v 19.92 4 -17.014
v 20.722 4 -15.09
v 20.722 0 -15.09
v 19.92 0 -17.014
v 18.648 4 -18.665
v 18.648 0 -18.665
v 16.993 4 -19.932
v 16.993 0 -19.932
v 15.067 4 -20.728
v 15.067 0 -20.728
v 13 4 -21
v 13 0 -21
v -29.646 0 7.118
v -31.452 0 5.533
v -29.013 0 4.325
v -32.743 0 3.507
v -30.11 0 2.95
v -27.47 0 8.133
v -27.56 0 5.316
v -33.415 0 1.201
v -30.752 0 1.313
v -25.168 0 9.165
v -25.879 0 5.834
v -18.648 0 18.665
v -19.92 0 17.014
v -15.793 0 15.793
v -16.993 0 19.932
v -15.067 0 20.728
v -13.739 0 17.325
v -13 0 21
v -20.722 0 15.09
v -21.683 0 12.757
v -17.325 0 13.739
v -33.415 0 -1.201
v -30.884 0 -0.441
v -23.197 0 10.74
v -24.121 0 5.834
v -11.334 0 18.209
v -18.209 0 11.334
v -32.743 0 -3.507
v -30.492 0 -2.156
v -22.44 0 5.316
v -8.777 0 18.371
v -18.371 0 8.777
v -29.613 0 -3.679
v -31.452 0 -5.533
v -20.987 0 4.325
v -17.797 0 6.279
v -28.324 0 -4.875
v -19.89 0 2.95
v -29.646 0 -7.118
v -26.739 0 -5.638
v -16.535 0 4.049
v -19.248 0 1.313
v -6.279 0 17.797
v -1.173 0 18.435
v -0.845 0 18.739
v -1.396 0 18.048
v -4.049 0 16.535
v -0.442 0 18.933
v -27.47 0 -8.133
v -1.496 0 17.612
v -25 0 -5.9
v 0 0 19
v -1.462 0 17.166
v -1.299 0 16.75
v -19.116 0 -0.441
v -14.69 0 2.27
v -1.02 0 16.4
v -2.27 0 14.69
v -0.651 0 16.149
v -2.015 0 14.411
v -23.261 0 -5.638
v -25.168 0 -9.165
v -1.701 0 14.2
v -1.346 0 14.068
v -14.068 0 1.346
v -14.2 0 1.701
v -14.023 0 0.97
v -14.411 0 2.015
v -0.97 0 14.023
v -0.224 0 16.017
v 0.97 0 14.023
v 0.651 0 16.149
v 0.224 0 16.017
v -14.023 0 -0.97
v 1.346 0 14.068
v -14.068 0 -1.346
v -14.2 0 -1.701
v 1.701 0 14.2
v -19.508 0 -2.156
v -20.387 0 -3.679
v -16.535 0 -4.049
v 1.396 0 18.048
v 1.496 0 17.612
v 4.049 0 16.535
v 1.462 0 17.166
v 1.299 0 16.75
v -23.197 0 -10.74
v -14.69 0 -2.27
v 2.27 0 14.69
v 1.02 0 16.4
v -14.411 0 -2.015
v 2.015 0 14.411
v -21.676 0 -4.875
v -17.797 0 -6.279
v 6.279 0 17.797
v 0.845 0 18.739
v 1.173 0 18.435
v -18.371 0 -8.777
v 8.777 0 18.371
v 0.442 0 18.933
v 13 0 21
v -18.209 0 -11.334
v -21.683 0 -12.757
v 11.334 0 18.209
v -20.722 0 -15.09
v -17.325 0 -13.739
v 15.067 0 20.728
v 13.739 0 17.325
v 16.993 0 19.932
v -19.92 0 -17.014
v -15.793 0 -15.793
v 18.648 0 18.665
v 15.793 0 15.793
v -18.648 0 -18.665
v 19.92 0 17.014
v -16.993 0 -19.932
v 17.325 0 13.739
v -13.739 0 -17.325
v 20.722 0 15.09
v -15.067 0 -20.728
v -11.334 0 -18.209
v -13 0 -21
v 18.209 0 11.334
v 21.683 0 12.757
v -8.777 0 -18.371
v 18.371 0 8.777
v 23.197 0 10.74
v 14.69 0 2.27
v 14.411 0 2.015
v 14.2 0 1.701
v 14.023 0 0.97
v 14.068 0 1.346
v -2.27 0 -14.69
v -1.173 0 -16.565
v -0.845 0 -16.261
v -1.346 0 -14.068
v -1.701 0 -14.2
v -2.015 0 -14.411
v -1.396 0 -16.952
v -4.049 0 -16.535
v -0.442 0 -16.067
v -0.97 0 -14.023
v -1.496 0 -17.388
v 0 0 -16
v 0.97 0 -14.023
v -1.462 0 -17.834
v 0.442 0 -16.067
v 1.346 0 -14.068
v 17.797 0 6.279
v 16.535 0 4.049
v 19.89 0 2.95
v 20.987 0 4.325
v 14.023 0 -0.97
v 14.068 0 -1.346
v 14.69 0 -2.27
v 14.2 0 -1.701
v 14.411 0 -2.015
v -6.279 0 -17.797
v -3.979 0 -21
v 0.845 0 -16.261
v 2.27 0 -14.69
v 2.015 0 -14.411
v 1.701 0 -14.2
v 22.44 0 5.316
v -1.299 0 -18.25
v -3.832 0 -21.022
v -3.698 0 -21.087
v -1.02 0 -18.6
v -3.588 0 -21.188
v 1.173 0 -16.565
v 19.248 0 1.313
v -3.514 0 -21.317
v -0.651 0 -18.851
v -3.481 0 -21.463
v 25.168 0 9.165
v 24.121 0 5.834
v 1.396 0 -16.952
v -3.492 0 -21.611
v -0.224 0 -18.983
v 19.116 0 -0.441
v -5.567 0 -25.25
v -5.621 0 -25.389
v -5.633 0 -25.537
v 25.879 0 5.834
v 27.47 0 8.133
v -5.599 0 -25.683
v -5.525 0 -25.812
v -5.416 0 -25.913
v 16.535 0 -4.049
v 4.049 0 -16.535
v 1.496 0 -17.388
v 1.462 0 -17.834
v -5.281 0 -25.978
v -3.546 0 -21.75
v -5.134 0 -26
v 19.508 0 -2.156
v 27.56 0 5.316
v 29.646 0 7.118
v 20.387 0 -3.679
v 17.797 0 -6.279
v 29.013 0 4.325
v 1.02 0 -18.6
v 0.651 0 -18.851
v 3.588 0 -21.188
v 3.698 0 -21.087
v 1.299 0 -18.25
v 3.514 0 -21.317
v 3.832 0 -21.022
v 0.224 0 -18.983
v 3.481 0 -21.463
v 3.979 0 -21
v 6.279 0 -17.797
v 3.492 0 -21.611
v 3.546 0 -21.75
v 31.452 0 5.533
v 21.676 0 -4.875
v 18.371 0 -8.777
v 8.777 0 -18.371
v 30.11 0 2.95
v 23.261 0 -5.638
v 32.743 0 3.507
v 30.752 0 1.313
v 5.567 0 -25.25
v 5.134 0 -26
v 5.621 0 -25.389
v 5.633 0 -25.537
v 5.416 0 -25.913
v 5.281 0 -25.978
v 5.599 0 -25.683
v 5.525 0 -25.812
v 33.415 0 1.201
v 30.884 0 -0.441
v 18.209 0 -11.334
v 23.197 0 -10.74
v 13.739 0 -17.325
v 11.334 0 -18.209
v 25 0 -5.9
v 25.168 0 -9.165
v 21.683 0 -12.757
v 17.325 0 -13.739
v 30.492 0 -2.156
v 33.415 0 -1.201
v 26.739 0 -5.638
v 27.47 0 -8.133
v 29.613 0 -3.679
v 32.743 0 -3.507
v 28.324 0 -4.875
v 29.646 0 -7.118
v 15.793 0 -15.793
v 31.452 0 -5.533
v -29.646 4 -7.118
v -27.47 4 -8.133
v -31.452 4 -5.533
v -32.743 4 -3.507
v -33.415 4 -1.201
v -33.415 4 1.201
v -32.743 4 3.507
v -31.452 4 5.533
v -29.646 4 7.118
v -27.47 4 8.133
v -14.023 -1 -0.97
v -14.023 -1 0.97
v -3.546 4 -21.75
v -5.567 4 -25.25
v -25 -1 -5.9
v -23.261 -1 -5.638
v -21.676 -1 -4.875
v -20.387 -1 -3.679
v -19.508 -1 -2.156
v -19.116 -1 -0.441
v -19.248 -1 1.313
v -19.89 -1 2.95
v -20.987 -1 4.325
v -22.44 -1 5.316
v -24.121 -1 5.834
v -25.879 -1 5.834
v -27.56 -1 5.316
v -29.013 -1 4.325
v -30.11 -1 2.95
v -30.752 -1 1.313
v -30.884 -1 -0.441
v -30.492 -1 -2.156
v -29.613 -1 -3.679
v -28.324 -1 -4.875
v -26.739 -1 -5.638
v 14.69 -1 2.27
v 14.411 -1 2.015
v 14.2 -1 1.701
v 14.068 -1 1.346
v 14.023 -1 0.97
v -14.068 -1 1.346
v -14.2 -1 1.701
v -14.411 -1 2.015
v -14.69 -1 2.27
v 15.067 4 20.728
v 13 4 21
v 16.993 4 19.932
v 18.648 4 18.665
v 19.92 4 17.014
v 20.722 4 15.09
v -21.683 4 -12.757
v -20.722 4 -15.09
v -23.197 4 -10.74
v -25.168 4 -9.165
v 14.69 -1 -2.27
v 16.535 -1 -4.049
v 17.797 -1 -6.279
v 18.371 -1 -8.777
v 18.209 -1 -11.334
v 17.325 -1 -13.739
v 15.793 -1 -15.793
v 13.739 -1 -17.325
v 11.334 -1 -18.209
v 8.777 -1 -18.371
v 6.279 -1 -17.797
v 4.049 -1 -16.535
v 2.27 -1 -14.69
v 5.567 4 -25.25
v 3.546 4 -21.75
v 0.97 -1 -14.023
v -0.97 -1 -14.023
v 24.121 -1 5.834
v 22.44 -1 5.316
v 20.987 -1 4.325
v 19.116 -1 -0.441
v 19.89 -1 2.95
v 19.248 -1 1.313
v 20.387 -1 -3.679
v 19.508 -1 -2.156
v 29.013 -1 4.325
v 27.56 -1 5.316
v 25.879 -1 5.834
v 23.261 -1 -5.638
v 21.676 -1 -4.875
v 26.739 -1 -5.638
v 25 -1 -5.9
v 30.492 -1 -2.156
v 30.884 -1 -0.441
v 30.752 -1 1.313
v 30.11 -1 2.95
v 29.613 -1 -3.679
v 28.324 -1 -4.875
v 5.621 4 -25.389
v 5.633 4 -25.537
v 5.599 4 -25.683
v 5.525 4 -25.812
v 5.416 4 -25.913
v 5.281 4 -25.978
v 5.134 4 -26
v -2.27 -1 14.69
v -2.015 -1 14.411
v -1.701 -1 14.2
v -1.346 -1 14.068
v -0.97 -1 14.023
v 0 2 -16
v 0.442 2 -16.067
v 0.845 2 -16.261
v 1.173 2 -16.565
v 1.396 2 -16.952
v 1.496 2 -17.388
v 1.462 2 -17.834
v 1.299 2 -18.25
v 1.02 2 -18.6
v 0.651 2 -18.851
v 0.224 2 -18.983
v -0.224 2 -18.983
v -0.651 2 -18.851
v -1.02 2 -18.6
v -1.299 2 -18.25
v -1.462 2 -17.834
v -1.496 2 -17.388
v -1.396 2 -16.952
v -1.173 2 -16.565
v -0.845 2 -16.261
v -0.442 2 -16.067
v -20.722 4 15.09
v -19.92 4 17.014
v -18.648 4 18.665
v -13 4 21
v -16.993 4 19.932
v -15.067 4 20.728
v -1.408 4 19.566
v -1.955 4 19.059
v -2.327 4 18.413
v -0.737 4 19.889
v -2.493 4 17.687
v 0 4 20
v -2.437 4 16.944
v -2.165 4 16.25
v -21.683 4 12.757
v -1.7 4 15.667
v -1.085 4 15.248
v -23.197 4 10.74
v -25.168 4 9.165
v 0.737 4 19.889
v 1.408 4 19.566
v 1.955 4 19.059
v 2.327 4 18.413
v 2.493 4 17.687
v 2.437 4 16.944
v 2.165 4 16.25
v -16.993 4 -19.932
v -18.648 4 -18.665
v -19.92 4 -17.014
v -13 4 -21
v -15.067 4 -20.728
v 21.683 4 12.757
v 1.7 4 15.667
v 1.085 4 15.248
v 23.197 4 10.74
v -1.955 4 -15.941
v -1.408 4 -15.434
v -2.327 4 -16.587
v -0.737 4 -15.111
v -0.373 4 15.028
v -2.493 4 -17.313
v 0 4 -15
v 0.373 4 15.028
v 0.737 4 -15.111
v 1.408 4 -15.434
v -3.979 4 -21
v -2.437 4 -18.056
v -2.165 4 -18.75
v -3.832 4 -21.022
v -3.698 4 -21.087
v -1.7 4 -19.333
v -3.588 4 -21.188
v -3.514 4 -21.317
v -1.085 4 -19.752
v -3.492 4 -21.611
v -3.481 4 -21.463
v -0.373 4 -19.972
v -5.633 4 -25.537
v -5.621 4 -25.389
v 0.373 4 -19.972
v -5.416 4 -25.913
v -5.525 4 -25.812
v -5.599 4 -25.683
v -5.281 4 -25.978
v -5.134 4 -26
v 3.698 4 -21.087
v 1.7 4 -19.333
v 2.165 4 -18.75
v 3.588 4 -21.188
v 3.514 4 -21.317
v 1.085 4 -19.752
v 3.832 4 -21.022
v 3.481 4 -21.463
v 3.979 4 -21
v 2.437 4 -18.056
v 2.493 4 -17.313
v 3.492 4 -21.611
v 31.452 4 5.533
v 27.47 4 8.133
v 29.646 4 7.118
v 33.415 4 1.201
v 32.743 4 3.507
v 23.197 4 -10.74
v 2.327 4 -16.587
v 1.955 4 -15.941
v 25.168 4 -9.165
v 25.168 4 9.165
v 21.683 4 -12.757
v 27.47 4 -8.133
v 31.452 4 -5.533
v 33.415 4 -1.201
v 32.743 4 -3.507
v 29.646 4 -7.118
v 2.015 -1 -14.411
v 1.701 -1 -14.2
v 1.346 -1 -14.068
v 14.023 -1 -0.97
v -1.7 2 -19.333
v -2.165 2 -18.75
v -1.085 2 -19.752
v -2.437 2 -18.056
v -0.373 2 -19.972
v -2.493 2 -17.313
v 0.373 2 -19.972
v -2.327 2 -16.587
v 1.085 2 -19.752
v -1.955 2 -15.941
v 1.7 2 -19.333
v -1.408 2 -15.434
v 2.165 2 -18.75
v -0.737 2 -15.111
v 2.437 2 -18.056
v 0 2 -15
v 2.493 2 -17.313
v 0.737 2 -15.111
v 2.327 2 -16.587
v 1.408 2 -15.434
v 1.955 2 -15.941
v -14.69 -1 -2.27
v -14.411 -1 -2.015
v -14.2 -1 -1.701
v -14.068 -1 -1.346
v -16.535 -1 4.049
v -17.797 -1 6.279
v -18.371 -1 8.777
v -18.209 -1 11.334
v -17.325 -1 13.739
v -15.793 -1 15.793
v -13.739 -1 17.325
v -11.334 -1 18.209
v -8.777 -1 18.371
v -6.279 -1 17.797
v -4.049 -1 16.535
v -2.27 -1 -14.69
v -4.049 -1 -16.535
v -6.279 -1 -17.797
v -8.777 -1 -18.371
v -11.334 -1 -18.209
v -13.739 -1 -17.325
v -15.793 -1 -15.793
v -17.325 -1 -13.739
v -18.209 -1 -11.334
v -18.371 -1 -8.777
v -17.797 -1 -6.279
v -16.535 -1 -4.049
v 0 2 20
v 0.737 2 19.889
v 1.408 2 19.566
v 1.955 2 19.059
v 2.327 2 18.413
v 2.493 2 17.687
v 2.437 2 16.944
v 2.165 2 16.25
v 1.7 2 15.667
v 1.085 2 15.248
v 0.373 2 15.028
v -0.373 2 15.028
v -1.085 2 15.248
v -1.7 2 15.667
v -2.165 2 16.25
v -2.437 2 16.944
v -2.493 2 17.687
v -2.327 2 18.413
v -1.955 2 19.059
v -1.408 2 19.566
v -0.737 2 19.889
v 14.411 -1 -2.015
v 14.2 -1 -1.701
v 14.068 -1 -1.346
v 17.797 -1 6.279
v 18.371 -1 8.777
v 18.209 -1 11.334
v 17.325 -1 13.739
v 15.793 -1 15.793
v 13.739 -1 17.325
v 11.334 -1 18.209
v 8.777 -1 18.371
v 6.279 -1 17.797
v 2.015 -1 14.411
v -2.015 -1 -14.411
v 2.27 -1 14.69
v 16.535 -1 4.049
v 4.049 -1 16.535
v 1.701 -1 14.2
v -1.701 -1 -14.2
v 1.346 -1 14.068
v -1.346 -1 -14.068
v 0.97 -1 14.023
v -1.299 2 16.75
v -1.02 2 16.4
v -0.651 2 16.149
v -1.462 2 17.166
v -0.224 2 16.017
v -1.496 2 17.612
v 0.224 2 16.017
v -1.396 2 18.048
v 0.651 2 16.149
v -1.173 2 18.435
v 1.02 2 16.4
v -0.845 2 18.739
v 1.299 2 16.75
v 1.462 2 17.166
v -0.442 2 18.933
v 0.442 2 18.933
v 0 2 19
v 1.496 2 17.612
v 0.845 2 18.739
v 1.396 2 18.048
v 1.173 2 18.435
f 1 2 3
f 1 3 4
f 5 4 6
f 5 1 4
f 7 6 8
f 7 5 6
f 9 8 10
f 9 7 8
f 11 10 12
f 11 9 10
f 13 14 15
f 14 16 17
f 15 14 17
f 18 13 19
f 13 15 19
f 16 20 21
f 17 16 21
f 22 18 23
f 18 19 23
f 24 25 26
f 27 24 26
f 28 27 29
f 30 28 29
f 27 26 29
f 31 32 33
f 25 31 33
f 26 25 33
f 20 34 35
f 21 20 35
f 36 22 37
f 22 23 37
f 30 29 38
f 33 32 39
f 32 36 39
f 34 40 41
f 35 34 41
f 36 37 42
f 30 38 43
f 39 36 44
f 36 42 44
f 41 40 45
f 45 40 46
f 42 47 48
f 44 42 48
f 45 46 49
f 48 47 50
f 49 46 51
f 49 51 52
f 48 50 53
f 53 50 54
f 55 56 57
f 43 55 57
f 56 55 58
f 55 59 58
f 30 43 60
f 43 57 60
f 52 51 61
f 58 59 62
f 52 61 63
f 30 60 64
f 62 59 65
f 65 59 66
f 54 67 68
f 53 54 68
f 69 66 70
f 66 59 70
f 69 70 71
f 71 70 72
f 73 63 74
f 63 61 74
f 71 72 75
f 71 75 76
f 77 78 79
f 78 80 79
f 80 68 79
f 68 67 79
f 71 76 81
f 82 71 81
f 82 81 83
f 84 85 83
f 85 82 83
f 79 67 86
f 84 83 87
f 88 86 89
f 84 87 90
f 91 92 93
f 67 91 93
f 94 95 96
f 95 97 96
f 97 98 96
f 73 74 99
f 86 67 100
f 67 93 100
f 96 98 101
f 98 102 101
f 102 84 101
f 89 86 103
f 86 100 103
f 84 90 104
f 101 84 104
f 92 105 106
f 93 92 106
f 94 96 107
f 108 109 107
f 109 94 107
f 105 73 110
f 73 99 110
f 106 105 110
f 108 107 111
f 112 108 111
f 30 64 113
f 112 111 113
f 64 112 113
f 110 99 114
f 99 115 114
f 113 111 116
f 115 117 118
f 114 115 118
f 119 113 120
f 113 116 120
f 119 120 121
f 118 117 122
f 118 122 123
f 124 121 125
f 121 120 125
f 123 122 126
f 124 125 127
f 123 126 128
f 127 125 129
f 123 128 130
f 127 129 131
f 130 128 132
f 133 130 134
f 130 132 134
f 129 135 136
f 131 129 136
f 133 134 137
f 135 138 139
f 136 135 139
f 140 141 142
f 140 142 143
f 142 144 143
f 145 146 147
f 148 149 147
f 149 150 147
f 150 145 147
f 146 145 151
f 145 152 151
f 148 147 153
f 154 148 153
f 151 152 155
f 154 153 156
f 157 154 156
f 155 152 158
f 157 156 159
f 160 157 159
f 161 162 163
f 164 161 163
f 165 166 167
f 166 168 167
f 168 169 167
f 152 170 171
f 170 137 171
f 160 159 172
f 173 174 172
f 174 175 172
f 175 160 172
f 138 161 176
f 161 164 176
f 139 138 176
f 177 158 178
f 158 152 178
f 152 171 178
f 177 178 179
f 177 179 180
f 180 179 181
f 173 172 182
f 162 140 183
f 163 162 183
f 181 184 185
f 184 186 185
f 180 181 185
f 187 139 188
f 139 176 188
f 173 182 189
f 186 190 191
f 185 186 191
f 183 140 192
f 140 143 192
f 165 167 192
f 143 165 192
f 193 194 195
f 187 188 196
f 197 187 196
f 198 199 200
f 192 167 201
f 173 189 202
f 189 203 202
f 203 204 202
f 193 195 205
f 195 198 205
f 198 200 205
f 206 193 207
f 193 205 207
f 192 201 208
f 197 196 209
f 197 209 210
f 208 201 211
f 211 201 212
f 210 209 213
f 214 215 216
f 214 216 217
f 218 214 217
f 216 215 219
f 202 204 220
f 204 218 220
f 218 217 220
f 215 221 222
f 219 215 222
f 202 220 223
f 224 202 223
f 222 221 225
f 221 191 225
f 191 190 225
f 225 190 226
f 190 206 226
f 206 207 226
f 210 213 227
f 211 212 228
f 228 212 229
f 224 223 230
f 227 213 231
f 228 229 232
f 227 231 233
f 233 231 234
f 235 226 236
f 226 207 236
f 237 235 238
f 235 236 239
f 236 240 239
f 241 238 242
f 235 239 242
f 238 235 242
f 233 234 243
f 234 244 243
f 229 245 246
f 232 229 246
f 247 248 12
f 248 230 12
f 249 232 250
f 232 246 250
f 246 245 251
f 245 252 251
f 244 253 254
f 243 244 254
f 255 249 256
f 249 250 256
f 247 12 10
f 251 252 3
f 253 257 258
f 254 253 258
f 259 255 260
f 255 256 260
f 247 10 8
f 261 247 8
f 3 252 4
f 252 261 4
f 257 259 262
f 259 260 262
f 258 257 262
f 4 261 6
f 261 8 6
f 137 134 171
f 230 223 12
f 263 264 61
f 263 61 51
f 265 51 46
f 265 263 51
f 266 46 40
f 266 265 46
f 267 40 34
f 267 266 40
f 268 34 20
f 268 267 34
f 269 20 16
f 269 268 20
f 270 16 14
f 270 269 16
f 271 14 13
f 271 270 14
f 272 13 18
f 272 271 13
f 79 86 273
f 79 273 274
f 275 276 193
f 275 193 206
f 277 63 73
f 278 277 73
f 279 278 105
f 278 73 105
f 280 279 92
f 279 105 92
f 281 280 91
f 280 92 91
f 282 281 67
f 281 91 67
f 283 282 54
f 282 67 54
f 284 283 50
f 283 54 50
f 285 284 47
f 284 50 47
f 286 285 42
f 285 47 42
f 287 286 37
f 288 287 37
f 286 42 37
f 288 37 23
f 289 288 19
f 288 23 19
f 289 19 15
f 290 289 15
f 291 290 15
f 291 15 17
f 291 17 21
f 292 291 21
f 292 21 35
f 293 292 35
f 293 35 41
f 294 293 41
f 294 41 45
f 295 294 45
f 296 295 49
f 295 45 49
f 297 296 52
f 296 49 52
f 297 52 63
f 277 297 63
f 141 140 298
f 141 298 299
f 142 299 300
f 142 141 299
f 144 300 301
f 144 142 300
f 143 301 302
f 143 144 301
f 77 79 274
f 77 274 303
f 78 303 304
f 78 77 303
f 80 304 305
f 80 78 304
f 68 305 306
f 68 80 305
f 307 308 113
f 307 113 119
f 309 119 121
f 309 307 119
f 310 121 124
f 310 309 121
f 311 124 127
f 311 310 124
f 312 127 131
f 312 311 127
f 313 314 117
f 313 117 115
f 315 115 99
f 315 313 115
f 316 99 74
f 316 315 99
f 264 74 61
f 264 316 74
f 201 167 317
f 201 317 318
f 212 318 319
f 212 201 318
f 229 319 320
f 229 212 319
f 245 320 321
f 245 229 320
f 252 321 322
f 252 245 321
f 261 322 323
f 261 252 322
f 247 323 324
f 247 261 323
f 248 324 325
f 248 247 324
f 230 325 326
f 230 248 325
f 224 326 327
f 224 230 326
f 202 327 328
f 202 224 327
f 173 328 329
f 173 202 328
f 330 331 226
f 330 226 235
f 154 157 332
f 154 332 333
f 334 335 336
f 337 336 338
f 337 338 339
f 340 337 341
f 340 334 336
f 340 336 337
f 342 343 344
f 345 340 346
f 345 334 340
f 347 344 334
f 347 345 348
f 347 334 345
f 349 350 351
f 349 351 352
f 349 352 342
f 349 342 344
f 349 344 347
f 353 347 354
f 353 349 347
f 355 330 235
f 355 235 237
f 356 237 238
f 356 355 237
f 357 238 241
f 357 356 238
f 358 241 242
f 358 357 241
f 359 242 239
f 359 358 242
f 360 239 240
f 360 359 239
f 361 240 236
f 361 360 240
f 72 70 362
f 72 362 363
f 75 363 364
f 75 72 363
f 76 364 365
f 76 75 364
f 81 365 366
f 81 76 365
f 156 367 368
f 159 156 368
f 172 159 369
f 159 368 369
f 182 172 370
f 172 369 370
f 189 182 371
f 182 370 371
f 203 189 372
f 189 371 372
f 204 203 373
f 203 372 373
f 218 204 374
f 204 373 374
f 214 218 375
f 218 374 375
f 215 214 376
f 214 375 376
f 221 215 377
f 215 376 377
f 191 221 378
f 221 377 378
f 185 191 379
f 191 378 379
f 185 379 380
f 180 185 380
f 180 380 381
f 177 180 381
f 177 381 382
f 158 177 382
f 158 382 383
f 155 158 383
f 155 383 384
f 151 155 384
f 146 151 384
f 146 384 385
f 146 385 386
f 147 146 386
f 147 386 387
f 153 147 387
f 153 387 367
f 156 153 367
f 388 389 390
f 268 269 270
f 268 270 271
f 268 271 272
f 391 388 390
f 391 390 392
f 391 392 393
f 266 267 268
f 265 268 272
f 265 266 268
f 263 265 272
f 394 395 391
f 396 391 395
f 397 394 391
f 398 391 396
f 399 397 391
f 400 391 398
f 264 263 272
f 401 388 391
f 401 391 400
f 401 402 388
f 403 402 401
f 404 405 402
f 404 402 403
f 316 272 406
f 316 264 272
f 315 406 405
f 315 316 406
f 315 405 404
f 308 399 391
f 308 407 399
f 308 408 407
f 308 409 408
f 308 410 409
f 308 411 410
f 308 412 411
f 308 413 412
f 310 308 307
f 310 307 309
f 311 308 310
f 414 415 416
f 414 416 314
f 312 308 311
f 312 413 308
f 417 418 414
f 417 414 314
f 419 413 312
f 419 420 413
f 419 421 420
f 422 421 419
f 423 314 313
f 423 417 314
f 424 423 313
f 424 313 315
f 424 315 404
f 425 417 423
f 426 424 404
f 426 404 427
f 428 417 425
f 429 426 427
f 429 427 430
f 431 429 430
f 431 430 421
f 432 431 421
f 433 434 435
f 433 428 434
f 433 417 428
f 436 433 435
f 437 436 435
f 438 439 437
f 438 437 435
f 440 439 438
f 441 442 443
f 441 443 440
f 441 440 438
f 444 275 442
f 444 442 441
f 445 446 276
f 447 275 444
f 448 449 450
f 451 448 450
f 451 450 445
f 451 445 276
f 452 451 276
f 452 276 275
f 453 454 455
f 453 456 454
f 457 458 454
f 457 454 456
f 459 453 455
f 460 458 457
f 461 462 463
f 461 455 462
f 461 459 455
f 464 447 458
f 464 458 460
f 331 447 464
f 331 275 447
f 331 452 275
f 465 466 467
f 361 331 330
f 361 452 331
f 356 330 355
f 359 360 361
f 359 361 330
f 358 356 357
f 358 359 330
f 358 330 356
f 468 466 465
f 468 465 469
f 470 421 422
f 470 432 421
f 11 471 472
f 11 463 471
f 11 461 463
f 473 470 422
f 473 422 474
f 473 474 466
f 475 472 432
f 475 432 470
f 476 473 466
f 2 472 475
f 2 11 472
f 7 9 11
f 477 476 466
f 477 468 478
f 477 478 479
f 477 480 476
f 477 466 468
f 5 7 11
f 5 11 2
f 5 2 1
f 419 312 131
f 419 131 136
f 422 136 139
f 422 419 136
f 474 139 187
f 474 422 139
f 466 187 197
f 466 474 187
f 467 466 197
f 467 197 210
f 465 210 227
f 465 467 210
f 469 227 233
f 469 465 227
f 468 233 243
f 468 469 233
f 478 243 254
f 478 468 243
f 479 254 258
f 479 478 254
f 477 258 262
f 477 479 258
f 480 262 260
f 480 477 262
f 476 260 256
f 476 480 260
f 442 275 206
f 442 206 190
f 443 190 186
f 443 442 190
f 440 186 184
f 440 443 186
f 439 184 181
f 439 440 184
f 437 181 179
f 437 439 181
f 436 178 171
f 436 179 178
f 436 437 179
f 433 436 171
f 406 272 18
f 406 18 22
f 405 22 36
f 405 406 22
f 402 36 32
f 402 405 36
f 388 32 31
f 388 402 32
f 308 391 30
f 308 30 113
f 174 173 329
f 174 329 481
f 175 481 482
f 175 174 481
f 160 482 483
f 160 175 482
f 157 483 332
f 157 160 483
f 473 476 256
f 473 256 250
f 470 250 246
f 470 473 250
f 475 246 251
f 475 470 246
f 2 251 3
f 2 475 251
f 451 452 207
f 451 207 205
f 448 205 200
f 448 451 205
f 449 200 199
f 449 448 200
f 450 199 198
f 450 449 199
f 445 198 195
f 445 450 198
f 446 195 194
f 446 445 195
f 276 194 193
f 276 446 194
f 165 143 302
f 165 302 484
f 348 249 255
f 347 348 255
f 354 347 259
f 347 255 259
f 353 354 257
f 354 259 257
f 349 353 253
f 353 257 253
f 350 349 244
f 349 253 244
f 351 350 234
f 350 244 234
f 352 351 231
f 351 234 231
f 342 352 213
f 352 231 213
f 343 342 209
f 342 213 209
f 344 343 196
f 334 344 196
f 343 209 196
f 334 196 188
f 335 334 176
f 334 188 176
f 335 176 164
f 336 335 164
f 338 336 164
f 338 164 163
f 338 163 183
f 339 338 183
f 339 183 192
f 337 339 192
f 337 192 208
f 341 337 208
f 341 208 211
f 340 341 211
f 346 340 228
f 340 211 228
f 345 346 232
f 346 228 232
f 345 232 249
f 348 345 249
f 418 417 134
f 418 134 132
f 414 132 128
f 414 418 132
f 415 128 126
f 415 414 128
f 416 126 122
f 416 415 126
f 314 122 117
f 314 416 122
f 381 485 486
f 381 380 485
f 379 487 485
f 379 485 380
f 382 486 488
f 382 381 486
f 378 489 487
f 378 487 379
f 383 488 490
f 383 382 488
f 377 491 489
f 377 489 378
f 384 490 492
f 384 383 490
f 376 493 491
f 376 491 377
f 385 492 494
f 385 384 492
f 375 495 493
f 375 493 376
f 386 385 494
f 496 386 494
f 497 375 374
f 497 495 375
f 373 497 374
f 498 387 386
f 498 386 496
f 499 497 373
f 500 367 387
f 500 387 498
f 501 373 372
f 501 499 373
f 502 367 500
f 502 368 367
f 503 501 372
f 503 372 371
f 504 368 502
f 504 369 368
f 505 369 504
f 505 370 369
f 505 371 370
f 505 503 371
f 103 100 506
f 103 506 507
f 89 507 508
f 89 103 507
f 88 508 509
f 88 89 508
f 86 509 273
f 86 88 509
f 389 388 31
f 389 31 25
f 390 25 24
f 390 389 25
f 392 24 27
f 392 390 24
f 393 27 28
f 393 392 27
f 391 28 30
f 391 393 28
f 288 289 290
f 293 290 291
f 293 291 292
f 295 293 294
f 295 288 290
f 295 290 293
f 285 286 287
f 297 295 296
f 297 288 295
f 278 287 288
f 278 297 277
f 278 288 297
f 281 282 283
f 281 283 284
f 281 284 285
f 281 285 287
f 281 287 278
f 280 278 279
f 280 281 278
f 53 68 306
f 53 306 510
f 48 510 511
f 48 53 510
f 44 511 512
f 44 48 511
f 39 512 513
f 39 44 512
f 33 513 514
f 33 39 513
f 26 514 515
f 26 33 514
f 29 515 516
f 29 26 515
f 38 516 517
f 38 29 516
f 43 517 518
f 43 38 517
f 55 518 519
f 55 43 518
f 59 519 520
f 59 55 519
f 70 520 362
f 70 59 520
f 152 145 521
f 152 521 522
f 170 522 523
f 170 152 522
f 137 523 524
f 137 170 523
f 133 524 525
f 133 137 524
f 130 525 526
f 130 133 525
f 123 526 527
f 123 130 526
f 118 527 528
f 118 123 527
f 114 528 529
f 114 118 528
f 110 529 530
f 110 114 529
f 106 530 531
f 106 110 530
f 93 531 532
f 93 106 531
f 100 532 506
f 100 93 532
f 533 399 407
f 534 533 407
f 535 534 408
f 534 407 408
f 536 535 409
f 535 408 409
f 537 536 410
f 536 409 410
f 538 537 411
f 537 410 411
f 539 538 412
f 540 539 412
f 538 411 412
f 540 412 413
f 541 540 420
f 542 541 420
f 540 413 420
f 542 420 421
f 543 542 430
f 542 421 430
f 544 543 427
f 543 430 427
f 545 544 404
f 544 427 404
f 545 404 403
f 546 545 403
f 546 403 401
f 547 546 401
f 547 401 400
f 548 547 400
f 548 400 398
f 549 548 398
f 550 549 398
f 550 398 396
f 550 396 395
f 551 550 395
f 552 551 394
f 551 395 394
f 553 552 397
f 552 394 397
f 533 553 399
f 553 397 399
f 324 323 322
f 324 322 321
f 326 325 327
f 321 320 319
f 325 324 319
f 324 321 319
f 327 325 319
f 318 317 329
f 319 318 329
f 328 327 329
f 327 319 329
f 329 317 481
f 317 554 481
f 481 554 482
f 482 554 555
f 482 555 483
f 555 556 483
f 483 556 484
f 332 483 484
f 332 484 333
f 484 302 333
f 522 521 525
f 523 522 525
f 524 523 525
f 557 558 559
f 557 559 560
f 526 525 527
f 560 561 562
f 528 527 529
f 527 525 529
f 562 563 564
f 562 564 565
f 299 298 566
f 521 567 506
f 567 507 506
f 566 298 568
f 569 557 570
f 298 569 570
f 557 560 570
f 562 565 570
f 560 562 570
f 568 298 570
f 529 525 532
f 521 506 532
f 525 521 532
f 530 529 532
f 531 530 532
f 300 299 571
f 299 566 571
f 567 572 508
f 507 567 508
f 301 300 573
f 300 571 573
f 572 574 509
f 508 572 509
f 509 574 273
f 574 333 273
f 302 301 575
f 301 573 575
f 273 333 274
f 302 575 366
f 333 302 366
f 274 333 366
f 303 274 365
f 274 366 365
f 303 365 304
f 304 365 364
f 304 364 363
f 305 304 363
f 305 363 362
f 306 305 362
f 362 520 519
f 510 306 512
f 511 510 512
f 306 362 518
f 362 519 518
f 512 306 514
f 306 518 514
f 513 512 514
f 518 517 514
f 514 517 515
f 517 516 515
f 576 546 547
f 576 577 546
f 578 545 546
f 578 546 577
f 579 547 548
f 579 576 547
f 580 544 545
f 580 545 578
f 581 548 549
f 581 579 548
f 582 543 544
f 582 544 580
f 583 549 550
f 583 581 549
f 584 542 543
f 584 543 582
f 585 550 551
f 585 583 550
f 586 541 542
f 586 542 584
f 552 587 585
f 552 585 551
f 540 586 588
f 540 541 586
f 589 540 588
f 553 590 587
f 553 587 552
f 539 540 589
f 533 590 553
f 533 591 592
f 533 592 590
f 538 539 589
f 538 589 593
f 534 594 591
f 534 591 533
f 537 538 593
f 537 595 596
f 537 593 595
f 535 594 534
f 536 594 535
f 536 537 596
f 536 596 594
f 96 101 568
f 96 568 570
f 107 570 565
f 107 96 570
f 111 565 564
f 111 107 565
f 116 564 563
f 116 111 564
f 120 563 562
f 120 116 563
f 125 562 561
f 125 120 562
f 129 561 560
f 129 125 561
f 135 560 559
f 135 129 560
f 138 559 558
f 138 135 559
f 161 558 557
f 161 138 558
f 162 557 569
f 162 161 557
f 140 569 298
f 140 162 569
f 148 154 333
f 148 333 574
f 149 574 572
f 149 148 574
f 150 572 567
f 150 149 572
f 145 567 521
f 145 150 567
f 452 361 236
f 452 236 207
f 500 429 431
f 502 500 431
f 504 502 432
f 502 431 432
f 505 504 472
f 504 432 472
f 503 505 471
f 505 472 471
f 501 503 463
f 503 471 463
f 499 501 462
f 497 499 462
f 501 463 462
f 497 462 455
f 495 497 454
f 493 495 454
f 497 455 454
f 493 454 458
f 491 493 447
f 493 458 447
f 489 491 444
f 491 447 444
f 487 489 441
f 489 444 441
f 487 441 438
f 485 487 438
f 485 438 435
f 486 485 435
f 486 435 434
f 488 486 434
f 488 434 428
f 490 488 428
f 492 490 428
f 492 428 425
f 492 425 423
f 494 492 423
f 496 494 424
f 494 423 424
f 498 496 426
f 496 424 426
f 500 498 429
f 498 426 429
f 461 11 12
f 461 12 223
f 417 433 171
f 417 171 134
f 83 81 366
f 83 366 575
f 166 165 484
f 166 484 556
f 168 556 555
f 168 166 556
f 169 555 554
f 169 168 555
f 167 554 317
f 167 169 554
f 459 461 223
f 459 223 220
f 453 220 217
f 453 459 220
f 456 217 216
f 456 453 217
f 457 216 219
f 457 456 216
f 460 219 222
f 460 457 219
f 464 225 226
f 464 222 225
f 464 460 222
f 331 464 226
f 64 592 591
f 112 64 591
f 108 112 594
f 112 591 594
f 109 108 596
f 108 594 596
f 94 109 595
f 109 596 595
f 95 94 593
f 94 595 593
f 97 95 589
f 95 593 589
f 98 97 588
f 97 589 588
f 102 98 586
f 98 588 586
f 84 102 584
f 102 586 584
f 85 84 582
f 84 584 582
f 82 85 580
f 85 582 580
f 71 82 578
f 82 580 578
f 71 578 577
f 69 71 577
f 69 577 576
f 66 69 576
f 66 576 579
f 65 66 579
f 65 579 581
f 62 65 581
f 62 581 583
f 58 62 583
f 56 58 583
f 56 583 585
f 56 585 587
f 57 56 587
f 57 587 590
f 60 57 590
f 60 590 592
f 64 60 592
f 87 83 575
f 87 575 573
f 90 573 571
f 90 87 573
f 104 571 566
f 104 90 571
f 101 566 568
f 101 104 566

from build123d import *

# Parameters (mm, degrees)
SKETCH_1_W          = 100
SKETCH_1_H          = 100
EXTRUDE_1_DEPTH     = 4
SKETCH_4_W          = 100
SKETCH_4_H          = 100
CUT_EXTRUDE_1_DEPTH = 71.823724839
SKETCH_5_R          = 5.9
EXTRUDE_2_DEPTH     = 1
SKETCH_6_R          = 1.5
SKETCH_6_R_2        = 1
CUT_EXTRUDE_2_DEPTH = 43.699531613
SKETCH_7_R          = 2.5
CUT_EXTRUDE_3_DEPTH = 2


with BuildPart() as part:
    # Эскиз1 → Бобышка-Вытянуть1 (new body)
    with BuildSketch(Plane(origin=(0, 0, 0), x_dir=(1, 0, 0), z_dir=(0, 1, 0))):
        Rectangle(SKETCH_1_W, SKETCH_1_H)
    extrude(amount=EXTRUDE_1_DEPTH)

    # Эскиз4 → Вырез-Вытянуть1 (cut, through all)
    with BuildSketch(Plane(origin=(0, 4, 0), x_dir=(1, 0, 0), z_dir=(0, 1, 0))):
        Rectangle(SKETCH_4_W, SKETCH_4_H)
        with BuildLine():
            Line((3.546261356, 21.75), (5.566987298, 25.25))
            ThreePointArc((5.566987298, 25.25), (5.566987298, 25.75), (5.133974596, 26))
            Line((5.133974596, 26), (-5.133974596, 26))
            ThreePointArc((-5.133974596, 26), (-5.566987298, 25.75), (-5.566987298, 25.25))
            Line((-5.566987298, 25.25), (-3.546261356, 21.75))
            ThreePointArc((-3.546261356, 21.75), (-3.546261356, 21.25), (-3.979274058, 21))
            Line((-3.979274058, 21), (-13, 21))
            ThreePointArc((-13, 21), (-17.862198755, 19.352875197), (-20.722235468, 15.089755817))
            ThreePointArc((-20.722235468, 15.089755817), (-23.196926567, 10.739563503), (-27.469608288, 8.133328648))
            ThreePointArc((-27.469608288, 8.133328648), (-33.5, 0), (-27.469608288, -8.133328648))
            ThreePointArc((-27.469608288, -8.133328648), (-23.196926567, -10.739563503), (-20.722235468, -15.089755817))
            ThreePointArc((-20.722235468, -15.089755817), (-17.862198755, -19.352875197), (-13, -21))
            Line((-13, -21), (13, -21))
            ThreePointArc((13, -21), (17.862198755, -19.352875197), (20.722235468, -15.089755817))
            ThreePointArc((20.722235468, -15.089755817), (23.196926567, -10.739563503), (27.469608288, -8.133328648))
            ThreePointArc((27.469608288, -8.133328648), (33.5, 0), (27.469608288, 8.133328648))
            ThreePointArc((27.469608288, 8.133328648), (23.196926567, 10.739563503), (20.722235468, 15.089755817))
            ThreePointArc((20.722235468, 15.089755817), (17.862198755, 19.352875197), (13, 21))
            Line((13, 21), (3.979274058, 21))
            ThreePointArc((3.979274058, 21), (3.546261356, 21.25), (3.546261356, 21.75))
        make_face(mode=Mode.SUBTRACT)
    extrude(amount=-CUT_EXTRUDE_1_DEPTH, mode=Mode.SUBTRACT)

    # Эскиз5 → Бобышка-Вытянуть2 (add)
    with BuildSketch(Plane.XZ):
        with Locations(Location((25, 0, 0), (0, 0, 270))):
            Circle(SKETCH_5_R)
        with Locations(Location((-25, 0, 0), (0, 0, 270))):
            Circle(SKETCH_5_R)
        with BuildLine():
            Line((-0.970460198, 14.023475383), (0.970460198, 14.023475383))
            ThreePointArc((0.970460198, 14.023475383), (1.700884179, 14.199930228), (2.270199596, 14.690374372))
            ThreePointArc((2.270199596, 14.690374372), (15.793250353, 15.793250353), (14.690374372, 2.270199596))
            ThreePointArc((14.690374372, 2.270199596), (14.199930228, 1.700884179), (14.023475383, 0.970460198))
            Line((14.023475383, 0.970460198), (14.023475383, -0.970460198))
            ThreePointArc((14.023475383, -0.970460198), (14.199930228, -1.700884179), (14.690374372, -2.270199596))
            ThreePointArc((14.690374372, -2.270199596), (15.793250353, -15.793250353), (2.270199596, -14.690374372))
            ThreePointArc((2.270199596, -14.690374372), (1.700884179, -14.199930228), (0.970460198, -14.023475383))
            Line((0.970460198, -14.023475383), (-0.970460198, -14.023475383))
            ThreePointArc((-0.970460198, -14.023475383), (-1.700884179, -14.199930228), (-2.270199596, -14.690374372))
            ThreePointArc((-2.270199596, -14.690374372), (-15.793250353, -15.793250353), (-14.690374372, -2.270199596))
            ThreePointArc((-14.690374372, -2.270199596), (-14.199930228, -1.700884179), (-14.023475383, -0.970460198))
            Line((-14.023475383, -0.970460198), (-14.023475383, 0.970460198))
            ThreePointArc((-14.023475383, 0.970460198), (-14.199930228, 1.700884179), (-14.690374372, 2.270199596))
            ThreePointArc((-14.690374372, 2.270199596), (-15.793250353, 15.793250353), (-2.270199596, 14.690374372))
            ThreePointArc((-2.270199596, 14.690374372), (-1.700884179, 14.199930228), (-0.970460198, 14.023475383))
        make_face()
    extrude(amount=EXTRUDE_2_DEPTH)

    # Эскиз6 → Вырез-Вытянуть2 (cut, through all)
    # profile 1 of 4: a face of its own
    with BuildSketch(Plane(origin=(0, 4, 0), x_dir=(1, 0, 0), z_dir=(0, 1, 0))):
        with Locations(Location((0, 17.5, 0), (0, 0, 270))):
            Circle(SKETCH_6_R)
        with Locations((0, 17.5)):
            Circle(SKETCH_6_R_2, mode=Mode.SUBTRACT)
    # profile 2 of 4: a face of its own
    with BuildSketch(Plane(origin=(0, 4, 0), x_dir=(1, 0, 0), z_dir=(0, 1, 0))):
        with Locations((0, 17.5)):
            Circle(SKETCH_6_R_2)
    # profile 3 of 4: a face of its own
    with BuildSketch(Plane(origin=(0, 4, 0), x_dir=(1, 0, 0), z_dir=(0, 1, 0))):
        with Locations(Location((0, -17.5, 0), (0, 0, 270))):
            Circle(SKETCH_6_R)
        with Locations((0, -17.5)):
            Circle(SKETCH_6_R_2, mode=Mode.SUBTRACT)
    # profile 4 of 4: a face of its own
    with BuildSketch(Plane(origin=(0, 4, 0), x_dir=(1, 0, 0), z_dir=(0, 1, 0))):
        with Locations((0, -17.5)):
            Circle(SKETCH_6_R_2)
    extrude(amount=-CUT_EXTRUDE_2_DEPTH, mode=Mode.SUBTRACT)

    # Эскиз7 → Вырез-Вытянуть3 (cut)
    with BuildSketch(Plane(origin=(0, 4, 0), x_dir=(1, 0, 0), z_dir=(0, 1, 0))):
        with Locations(Location((0, 17.5, 0), (0, 0, 270))):
            Circle(SKETCH_7_R)
        with Locations(Location((0, -17.5, 0), (0, 0, 270))):
            Circle(SKETCH_7_R)
    extrude(amount=-CUT_EXTRUDE_3_DEPTH, mode=Mode.SUBTRACT)


solid = part.part
